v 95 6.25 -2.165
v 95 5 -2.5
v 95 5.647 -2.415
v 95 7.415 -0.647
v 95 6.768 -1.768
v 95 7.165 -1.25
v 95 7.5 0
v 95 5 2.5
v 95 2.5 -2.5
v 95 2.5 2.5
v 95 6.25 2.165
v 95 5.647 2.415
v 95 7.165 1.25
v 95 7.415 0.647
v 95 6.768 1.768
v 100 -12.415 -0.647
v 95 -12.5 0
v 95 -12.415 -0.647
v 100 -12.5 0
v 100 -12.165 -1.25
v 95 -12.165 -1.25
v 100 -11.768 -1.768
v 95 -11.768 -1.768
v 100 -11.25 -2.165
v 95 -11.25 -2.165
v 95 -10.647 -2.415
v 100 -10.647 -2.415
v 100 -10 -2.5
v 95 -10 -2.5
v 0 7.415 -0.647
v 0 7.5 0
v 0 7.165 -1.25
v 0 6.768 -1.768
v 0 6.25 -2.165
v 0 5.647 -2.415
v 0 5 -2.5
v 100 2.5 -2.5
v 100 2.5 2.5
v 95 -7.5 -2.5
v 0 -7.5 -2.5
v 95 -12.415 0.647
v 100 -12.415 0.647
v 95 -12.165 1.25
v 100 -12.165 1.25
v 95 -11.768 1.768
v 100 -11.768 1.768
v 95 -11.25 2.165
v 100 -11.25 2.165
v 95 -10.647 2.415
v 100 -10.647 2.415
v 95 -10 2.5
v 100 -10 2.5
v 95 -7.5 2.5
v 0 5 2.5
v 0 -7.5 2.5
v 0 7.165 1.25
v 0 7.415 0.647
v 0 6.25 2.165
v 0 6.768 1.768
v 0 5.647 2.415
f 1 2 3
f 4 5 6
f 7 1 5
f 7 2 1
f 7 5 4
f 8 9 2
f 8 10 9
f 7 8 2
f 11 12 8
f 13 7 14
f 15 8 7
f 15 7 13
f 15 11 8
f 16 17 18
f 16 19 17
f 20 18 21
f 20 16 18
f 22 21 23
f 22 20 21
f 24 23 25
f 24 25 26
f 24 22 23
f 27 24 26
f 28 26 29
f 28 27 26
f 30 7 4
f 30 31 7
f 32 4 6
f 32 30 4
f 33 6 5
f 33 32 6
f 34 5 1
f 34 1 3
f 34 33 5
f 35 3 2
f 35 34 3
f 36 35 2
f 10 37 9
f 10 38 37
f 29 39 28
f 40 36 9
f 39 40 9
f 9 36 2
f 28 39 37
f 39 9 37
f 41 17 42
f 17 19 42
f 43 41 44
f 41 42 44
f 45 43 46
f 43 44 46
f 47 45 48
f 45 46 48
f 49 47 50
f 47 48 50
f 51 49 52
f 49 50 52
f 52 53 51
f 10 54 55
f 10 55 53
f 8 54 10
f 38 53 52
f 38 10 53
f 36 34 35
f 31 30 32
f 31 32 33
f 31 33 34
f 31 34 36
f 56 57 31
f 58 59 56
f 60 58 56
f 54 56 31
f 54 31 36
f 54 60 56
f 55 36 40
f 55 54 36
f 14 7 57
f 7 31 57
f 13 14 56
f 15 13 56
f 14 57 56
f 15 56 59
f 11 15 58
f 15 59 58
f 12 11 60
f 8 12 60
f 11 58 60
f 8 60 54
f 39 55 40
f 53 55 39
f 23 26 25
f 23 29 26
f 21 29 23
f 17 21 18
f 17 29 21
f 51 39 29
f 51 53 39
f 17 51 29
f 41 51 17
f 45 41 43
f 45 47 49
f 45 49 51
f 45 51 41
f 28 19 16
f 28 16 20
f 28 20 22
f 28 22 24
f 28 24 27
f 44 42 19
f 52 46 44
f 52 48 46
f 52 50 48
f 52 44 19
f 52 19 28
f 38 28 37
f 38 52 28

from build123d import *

# Parameters (mm, degrees)
F1_DEPTH = 2.5
F2_R     = 2.49999


# Not quite as in the source:
# - a fillet or chamfer is up to 0.001 mm smaller than in the source, because OpenCascade refuses the exact size


with BuildPart() as f1:
    # F0 (on Top) → F1 (new body, symmetric)
    with BuildSketch(Plane.XY):
        Polygon((95, 7.5), (0, 7.5), (0, -7.5), (95, -7.5), (95, -12.5), (100, -12.5), (100, 2.5), (95, 2.5), align=None)
    extrude(amount=F1_DEPTH, both=True)

    # F2 (radius 2.5 in the source; OpenCascade refuses exactly that, so slightly less here)
    f2_edges = [f1.edges().sort_by_distance(p)[0] for p in [
        (97.5, -12.5, 2.5),
        (97.5, -12.5, -2.5),
        (47.5, 7.5, 2.5),
        (47.5, 7.5, -2.5),
    ]]
    fillet(f2_edges, radius=F2_R)


solid = f1.part
